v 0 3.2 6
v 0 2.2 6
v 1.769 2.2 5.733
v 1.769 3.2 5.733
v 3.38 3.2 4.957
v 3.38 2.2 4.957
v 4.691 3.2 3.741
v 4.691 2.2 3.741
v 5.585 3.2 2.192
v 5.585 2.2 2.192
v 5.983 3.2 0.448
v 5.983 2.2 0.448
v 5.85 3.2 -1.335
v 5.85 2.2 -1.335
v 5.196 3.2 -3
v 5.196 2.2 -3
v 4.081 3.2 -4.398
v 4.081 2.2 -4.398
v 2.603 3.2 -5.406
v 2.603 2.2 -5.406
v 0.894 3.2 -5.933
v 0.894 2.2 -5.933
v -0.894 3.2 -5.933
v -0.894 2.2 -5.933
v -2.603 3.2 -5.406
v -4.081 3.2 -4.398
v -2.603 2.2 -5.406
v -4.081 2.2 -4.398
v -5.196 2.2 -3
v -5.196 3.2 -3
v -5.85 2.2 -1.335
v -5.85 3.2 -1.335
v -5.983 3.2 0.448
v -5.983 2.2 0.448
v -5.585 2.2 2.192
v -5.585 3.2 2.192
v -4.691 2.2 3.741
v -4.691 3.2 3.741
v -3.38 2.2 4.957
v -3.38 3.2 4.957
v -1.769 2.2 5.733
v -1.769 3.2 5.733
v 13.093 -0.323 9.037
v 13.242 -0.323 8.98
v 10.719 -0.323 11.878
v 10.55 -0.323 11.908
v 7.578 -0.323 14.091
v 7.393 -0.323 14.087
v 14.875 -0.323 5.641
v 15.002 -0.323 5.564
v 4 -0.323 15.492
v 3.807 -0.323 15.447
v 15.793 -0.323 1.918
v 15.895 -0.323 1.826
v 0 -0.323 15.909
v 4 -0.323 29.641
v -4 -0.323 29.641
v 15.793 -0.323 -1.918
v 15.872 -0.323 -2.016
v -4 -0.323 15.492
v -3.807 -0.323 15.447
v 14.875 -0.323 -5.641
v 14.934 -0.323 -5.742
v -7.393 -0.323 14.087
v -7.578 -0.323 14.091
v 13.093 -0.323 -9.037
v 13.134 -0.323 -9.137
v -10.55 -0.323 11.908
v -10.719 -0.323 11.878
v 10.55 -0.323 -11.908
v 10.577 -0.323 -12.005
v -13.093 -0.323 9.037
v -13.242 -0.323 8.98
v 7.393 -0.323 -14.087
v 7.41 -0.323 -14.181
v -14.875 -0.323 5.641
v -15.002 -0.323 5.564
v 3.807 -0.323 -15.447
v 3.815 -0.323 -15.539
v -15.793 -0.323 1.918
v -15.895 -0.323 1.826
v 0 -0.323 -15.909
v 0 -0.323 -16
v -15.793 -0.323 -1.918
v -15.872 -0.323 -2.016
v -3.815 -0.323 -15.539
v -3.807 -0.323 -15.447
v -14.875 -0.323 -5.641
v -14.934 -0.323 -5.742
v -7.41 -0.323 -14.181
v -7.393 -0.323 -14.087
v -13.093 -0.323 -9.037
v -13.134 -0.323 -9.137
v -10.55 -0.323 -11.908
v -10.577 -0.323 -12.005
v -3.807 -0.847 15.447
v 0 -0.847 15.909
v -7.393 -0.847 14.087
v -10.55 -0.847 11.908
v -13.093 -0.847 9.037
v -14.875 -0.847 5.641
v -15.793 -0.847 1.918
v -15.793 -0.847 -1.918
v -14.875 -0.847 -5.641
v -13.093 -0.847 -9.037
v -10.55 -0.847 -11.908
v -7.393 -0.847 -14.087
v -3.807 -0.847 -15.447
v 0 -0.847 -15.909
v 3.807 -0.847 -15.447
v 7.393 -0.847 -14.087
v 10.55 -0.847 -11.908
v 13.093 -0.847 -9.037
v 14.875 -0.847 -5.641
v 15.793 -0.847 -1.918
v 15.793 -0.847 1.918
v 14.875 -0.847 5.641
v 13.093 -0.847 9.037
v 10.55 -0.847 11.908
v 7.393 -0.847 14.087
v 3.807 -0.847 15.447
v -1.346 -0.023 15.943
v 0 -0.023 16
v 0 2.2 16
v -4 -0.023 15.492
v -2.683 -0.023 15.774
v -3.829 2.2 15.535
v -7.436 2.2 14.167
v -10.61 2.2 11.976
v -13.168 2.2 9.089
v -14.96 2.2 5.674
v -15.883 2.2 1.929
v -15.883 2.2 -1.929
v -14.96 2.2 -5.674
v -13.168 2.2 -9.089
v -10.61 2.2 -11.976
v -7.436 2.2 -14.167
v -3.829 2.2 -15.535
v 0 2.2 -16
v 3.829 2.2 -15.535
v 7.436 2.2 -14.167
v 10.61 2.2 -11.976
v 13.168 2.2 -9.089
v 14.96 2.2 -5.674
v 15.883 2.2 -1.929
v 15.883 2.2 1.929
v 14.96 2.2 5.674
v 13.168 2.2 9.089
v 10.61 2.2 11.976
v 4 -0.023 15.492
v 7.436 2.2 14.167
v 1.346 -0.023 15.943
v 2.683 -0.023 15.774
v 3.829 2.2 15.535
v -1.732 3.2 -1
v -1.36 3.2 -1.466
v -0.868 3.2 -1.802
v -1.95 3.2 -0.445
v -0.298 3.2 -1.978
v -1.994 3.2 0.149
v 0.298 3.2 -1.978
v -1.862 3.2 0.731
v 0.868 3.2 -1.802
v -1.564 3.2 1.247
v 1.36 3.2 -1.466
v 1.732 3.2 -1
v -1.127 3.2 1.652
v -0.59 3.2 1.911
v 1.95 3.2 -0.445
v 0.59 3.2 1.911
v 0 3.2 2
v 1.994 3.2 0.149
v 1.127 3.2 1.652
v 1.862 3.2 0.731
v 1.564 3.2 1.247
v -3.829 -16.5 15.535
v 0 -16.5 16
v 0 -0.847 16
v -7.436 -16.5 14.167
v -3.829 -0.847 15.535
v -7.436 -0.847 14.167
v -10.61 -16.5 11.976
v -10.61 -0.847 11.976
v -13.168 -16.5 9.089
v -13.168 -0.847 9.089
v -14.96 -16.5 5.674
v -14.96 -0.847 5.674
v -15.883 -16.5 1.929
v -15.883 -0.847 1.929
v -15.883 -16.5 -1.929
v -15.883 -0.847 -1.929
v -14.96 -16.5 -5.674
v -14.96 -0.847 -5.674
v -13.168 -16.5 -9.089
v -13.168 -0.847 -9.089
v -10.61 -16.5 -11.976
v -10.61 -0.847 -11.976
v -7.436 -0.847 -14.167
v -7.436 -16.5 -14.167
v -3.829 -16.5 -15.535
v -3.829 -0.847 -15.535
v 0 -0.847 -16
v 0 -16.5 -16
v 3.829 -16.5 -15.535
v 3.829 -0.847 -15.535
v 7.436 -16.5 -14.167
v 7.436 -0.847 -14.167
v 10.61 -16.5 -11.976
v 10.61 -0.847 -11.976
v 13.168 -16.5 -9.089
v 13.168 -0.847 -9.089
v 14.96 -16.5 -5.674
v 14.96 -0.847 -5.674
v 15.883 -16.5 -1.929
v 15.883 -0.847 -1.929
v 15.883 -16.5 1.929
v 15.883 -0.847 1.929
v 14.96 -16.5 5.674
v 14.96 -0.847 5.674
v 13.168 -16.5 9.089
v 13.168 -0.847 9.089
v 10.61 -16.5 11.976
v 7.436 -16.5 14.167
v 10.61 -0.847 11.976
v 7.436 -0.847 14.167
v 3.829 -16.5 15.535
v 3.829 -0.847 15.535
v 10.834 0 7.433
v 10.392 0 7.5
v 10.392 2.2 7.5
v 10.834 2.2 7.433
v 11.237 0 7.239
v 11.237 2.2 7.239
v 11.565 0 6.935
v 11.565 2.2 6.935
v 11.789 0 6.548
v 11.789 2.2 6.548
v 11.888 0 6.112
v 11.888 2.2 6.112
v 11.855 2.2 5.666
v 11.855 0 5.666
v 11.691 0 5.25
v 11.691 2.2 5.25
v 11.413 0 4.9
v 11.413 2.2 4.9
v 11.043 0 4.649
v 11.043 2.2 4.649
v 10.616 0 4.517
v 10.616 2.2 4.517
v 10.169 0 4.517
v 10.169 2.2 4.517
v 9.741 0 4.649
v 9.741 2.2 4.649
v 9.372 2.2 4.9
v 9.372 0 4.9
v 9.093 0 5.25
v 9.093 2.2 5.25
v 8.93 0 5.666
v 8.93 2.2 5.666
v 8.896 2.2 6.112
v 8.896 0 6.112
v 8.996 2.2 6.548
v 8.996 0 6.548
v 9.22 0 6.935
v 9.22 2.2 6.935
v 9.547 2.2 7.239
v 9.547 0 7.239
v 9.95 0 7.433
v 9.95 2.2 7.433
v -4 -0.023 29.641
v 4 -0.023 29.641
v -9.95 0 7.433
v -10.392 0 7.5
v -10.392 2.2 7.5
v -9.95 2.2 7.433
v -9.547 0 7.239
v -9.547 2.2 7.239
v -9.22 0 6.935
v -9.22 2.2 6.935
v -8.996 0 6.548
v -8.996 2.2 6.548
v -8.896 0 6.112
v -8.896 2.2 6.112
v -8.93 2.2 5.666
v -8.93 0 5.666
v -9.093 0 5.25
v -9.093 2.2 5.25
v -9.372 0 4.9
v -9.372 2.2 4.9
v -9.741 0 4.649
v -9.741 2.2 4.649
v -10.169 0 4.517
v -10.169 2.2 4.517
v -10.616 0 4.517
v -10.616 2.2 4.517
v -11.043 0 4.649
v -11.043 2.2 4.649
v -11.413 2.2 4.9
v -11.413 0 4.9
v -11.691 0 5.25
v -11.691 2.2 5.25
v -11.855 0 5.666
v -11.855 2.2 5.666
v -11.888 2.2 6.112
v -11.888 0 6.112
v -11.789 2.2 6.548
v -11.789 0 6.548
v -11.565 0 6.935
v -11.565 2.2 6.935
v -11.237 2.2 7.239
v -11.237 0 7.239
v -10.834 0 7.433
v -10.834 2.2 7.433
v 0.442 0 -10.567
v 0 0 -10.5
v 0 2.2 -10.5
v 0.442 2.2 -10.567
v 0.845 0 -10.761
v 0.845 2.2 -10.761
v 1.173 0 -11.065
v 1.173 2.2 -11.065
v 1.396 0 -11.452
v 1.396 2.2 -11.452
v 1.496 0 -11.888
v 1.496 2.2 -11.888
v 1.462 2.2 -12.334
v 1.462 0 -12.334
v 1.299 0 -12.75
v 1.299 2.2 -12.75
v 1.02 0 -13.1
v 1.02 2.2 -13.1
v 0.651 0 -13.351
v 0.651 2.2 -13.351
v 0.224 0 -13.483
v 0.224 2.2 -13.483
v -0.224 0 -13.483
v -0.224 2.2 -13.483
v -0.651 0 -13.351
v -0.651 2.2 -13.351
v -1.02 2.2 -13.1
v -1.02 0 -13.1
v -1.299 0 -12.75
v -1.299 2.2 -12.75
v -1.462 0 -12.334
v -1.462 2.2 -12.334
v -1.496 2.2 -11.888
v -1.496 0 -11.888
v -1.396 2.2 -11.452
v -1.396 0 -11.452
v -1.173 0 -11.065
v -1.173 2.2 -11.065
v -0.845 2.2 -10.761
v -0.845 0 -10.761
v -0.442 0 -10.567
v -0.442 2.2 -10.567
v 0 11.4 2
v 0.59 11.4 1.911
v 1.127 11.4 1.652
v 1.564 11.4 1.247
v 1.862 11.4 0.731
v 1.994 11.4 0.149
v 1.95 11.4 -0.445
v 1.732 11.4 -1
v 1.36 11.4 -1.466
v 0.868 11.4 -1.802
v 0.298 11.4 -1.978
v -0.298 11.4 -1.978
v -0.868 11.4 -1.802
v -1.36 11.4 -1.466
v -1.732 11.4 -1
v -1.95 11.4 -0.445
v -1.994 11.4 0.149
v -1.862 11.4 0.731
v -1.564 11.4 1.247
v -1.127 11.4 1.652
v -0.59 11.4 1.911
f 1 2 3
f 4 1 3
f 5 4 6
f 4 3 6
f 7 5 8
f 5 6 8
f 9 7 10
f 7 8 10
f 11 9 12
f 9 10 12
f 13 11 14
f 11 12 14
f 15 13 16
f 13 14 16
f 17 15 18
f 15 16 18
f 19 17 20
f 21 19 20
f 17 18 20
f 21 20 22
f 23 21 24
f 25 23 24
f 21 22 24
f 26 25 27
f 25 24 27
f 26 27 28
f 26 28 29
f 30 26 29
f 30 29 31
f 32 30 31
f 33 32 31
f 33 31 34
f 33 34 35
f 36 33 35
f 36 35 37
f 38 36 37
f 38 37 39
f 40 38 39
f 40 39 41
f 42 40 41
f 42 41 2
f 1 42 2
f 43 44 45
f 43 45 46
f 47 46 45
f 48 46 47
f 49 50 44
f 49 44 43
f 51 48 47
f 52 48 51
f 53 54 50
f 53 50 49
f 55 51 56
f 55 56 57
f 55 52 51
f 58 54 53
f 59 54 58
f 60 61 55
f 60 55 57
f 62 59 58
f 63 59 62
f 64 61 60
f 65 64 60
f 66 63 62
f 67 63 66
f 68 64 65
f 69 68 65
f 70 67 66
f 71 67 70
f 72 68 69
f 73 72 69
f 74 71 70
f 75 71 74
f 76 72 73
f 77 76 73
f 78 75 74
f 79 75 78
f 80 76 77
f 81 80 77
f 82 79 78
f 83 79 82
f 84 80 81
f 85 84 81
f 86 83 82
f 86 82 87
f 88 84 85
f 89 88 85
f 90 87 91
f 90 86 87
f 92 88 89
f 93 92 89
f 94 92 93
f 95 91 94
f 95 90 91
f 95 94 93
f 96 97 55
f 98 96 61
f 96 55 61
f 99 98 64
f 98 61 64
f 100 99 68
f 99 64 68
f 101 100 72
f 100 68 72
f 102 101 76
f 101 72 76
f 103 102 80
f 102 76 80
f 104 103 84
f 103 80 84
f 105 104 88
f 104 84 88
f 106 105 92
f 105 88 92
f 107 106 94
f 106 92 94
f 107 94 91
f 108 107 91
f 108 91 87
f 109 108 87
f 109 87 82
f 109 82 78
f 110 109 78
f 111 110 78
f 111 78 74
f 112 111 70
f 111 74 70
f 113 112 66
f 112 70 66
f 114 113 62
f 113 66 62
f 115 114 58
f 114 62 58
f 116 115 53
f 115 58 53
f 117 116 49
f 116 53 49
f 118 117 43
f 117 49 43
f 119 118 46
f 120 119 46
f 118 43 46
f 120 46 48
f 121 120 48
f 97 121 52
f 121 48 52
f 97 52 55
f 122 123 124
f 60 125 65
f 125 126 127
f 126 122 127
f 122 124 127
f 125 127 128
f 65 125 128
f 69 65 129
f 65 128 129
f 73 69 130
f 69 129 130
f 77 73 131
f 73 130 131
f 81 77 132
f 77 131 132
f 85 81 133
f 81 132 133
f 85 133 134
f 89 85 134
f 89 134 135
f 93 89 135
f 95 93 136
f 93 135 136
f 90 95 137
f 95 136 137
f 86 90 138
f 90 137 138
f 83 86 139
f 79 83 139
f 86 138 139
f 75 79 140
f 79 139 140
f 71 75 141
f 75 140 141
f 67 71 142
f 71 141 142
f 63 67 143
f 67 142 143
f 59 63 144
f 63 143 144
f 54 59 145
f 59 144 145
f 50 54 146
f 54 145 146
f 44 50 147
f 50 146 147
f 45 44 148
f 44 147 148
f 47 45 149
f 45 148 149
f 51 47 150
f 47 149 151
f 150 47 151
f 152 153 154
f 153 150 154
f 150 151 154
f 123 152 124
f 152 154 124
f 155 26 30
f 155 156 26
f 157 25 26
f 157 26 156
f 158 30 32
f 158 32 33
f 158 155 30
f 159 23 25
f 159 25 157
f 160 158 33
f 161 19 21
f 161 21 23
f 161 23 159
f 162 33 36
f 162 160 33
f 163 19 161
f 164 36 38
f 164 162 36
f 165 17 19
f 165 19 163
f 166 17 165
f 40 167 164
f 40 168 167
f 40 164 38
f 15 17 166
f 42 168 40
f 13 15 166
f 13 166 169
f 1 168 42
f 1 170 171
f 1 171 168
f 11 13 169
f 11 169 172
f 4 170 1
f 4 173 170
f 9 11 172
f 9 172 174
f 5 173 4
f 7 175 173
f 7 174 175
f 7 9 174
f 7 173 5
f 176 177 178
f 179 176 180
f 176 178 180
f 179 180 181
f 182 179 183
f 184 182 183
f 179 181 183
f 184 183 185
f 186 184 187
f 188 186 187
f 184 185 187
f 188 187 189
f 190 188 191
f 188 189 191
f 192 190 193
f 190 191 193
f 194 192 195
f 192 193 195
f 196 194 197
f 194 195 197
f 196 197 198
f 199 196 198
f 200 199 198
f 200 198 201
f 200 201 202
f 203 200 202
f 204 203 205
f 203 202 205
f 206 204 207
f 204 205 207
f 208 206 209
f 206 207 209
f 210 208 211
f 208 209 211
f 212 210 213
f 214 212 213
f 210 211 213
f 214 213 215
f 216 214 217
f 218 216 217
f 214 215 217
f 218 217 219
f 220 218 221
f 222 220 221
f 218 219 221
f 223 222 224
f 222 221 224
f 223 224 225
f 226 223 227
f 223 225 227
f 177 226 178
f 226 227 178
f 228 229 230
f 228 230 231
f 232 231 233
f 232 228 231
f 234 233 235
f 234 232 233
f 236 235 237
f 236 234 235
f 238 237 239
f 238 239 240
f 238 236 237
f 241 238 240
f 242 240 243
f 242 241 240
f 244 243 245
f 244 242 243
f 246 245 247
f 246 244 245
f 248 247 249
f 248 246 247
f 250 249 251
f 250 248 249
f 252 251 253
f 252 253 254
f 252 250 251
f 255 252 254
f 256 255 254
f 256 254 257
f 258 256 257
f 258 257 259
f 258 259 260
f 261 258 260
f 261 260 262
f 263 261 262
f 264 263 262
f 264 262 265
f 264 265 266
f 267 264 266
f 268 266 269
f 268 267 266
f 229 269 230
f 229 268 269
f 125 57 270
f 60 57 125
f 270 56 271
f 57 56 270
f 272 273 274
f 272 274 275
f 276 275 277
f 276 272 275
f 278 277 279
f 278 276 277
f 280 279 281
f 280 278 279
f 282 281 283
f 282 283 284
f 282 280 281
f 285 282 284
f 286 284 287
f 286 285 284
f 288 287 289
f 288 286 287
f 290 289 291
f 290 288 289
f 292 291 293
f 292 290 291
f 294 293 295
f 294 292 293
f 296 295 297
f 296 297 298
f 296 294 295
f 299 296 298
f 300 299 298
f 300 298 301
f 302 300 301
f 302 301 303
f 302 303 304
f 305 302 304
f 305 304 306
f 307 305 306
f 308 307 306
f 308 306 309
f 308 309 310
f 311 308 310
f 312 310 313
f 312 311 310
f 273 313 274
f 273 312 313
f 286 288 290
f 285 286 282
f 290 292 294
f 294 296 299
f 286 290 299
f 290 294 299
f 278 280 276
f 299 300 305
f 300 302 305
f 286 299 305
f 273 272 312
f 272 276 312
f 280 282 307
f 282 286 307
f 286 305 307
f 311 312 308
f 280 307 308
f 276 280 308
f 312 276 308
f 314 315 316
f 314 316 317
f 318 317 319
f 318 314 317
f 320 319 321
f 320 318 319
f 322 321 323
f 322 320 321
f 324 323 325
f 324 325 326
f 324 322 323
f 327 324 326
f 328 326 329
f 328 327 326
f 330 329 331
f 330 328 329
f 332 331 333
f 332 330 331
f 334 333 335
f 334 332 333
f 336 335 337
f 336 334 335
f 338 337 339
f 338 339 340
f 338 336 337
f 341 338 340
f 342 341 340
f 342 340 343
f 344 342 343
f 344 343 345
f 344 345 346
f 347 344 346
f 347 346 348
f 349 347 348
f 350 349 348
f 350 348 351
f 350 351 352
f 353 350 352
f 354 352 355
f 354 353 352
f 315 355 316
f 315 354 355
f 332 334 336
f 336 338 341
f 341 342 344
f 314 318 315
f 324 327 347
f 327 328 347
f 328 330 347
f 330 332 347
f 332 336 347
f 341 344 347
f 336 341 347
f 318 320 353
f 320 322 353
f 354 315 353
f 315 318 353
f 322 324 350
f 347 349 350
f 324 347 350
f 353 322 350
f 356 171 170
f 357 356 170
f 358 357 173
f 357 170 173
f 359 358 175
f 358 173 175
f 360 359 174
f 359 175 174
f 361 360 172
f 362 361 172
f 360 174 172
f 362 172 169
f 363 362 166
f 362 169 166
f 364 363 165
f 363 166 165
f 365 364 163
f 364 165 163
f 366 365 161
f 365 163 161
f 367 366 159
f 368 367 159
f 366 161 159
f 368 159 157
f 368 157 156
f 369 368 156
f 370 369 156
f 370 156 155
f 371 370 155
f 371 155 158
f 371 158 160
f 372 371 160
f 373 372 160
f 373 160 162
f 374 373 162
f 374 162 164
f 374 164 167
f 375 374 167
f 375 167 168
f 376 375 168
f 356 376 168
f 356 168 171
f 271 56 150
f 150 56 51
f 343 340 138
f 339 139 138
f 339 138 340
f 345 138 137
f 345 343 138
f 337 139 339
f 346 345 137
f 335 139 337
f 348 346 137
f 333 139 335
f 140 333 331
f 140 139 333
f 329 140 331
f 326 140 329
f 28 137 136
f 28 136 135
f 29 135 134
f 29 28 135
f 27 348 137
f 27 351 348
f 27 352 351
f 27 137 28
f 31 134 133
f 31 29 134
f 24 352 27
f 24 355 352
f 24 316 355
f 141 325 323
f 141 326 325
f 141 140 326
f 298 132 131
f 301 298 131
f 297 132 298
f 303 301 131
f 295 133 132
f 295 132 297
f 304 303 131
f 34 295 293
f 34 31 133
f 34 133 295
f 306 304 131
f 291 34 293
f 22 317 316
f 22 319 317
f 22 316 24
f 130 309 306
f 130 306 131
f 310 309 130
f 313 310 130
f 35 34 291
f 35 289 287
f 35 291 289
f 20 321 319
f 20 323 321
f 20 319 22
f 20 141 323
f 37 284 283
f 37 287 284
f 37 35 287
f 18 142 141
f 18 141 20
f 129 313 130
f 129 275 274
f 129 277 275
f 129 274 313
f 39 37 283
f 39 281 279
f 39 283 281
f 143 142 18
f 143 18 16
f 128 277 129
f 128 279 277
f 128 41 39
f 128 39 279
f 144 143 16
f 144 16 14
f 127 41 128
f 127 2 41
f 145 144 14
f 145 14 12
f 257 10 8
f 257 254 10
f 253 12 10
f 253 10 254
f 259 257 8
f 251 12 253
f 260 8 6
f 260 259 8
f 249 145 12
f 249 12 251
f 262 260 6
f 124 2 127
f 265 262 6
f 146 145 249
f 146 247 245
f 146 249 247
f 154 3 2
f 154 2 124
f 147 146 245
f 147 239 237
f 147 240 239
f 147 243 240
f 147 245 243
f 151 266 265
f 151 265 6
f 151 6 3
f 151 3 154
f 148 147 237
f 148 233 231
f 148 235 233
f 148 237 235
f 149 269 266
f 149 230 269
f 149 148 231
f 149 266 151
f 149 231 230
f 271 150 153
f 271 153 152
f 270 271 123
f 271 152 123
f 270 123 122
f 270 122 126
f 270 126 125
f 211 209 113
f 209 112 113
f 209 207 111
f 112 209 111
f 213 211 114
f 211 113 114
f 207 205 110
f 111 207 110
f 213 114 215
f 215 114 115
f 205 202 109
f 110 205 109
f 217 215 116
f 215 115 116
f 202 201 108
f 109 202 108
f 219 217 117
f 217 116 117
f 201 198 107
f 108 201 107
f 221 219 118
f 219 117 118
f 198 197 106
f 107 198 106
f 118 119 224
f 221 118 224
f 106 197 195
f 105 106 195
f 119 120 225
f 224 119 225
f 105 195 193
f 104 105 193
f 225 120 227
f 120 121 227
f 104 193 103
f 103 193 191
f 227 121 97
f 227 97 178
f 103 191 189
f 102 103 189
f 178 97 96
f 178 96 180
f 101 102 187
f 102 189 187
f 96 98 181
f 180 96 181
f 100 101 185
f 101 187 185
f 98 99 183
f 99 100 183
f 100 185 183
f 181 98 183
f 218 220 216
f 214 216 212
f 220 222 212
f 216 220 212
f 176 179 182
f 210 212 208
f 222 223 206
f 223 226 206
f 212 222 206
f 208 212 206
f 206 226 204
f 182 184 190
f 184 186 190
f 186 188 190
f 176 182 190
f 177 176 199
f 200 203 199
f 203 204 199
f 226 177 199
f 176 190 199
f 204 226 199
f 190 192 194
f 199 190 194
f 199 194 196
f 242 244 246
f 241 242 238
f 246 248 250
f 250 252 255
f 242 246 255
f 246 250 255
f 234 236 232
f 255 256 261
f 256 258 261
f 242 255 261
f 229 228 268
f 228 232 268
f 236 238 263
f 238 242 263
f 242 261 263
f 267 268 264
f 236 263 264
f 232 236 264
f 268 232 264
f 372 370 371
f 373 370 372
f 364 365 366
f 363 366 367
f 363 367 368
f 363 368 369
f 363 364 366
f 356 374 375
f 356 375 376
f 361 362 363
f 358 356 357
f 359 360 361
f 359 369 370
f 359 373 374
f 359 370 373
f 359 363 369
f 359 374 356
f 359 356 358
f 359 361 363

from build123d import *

# Parameters (mm, degrees)
CROQUIS1_R              = 16
CROQUIS1_R_2            = 1.5
CROQUIS1_R_3            = 6
SALIENTE_EXTRUIR1_DEPTH = 2.2
CROQUIS1_3_R            = 6
CROQUIS1_3_R_2          = 2
SALIENTE_EXTRUIR2_DEPTH = 3.2
CROQUIS1_4_R            = 2
SALIENTE_EXTRUIR3_DEPTH = 11.4
CROQUIS5_W              = 8
CROQUIS5_H              = 20.560227787
SALIENTE_EXTRUIR4_DEPTH = 0.3


with BuildPart() as part:
    # Croquis1 → Saliente-Extruir1 (new body)
    with BuildSketch(Plane(origin=(0, 0, 0), x_dir=(1, 0, 0), z_dir=(0, 1, 0))):
        Circle(CROQUIS1_R)
        with Locations((0, 12)):
            Circle(CROQUIS1_R_2, mode=Mode.SUBTRACT)
        with Locations((-10.392304845, -6)):
            Circle(CROQUIS1_R_2, mode=Mode.SUBTRACT)
        with Locations((10.392304845, -6)):
            Circle(CROQUIS1_R_2, mode=Mode.SUBTRACT)
        Circle(CROQUIS1_R_3, mode=Mode.SUBTRACT)
    extrude(amount=SALIENTE_EXTRUIR1_DEPTH)



with BuildPart() as body_2:
    # Croquis1<3> → Saliente-Extruir2 (new body)
    with BuildSketch(Plane(origin=(0, 0, 0), x_dir=(1, 0, 0), z_dir=(0, 1, 0))):
        Circle(CROQUIS1_3_R)
        Circle(CROQUIS1_3_R_2, mode=Mode.SUBTRACT)
    extrude(amount=SALIENTE_EXTRUIR2_DEPTH)


with BuildPart() as part_1:
    add(part.part)

    add(body_2.part)  # Saliente-Extruir3 merges body 2
    # Croquis1<4> → Saliente-Extruir3 (add)
    with BuildSketch(Plane(origin=(0, 0, 0), x_dir=(1, 0, 0), z_dir=(0, 1, 0))):
        Circle(CROQUIS1_4_R)
    extrude(amount=SALIENTE_EXTRUIR3_DEPTH)

    # Croquis4 → Revolución1 (revolve)
    with BuildSketch(Plane(origin=(0, 0, 0), x_dir=(0, 0, -1), z_dir=(1, 0, 0))):
        Polygon((15.909149683, -0.847381969), (15.909149683, -0.322612836), (16, -0.322612836), (16, 0), (0, 0), (0, -16.5), (1, -16.5), (1.1, -16.5), (16, -16.5), (16, -0.847381969), align=None)
    revolve(axis=Axis((0, 0, 0), (0, -1, 0)))

    # Croquis5 → Saliente-Extruir4 (add)
    with BuildSketch(Plane(origin=(0, -0.322612836, 0), x_dir=(-1, 0, 0), z_dir=(0, -1, 0))):
        with Locations((0, -19.361082391)):
            Rectangle(CROQUIS5_W, CROQUIS5_H)
    extrude(amount=-SALIENTE_EXTRUIR4_DEPTH)


solid = part_1.part
